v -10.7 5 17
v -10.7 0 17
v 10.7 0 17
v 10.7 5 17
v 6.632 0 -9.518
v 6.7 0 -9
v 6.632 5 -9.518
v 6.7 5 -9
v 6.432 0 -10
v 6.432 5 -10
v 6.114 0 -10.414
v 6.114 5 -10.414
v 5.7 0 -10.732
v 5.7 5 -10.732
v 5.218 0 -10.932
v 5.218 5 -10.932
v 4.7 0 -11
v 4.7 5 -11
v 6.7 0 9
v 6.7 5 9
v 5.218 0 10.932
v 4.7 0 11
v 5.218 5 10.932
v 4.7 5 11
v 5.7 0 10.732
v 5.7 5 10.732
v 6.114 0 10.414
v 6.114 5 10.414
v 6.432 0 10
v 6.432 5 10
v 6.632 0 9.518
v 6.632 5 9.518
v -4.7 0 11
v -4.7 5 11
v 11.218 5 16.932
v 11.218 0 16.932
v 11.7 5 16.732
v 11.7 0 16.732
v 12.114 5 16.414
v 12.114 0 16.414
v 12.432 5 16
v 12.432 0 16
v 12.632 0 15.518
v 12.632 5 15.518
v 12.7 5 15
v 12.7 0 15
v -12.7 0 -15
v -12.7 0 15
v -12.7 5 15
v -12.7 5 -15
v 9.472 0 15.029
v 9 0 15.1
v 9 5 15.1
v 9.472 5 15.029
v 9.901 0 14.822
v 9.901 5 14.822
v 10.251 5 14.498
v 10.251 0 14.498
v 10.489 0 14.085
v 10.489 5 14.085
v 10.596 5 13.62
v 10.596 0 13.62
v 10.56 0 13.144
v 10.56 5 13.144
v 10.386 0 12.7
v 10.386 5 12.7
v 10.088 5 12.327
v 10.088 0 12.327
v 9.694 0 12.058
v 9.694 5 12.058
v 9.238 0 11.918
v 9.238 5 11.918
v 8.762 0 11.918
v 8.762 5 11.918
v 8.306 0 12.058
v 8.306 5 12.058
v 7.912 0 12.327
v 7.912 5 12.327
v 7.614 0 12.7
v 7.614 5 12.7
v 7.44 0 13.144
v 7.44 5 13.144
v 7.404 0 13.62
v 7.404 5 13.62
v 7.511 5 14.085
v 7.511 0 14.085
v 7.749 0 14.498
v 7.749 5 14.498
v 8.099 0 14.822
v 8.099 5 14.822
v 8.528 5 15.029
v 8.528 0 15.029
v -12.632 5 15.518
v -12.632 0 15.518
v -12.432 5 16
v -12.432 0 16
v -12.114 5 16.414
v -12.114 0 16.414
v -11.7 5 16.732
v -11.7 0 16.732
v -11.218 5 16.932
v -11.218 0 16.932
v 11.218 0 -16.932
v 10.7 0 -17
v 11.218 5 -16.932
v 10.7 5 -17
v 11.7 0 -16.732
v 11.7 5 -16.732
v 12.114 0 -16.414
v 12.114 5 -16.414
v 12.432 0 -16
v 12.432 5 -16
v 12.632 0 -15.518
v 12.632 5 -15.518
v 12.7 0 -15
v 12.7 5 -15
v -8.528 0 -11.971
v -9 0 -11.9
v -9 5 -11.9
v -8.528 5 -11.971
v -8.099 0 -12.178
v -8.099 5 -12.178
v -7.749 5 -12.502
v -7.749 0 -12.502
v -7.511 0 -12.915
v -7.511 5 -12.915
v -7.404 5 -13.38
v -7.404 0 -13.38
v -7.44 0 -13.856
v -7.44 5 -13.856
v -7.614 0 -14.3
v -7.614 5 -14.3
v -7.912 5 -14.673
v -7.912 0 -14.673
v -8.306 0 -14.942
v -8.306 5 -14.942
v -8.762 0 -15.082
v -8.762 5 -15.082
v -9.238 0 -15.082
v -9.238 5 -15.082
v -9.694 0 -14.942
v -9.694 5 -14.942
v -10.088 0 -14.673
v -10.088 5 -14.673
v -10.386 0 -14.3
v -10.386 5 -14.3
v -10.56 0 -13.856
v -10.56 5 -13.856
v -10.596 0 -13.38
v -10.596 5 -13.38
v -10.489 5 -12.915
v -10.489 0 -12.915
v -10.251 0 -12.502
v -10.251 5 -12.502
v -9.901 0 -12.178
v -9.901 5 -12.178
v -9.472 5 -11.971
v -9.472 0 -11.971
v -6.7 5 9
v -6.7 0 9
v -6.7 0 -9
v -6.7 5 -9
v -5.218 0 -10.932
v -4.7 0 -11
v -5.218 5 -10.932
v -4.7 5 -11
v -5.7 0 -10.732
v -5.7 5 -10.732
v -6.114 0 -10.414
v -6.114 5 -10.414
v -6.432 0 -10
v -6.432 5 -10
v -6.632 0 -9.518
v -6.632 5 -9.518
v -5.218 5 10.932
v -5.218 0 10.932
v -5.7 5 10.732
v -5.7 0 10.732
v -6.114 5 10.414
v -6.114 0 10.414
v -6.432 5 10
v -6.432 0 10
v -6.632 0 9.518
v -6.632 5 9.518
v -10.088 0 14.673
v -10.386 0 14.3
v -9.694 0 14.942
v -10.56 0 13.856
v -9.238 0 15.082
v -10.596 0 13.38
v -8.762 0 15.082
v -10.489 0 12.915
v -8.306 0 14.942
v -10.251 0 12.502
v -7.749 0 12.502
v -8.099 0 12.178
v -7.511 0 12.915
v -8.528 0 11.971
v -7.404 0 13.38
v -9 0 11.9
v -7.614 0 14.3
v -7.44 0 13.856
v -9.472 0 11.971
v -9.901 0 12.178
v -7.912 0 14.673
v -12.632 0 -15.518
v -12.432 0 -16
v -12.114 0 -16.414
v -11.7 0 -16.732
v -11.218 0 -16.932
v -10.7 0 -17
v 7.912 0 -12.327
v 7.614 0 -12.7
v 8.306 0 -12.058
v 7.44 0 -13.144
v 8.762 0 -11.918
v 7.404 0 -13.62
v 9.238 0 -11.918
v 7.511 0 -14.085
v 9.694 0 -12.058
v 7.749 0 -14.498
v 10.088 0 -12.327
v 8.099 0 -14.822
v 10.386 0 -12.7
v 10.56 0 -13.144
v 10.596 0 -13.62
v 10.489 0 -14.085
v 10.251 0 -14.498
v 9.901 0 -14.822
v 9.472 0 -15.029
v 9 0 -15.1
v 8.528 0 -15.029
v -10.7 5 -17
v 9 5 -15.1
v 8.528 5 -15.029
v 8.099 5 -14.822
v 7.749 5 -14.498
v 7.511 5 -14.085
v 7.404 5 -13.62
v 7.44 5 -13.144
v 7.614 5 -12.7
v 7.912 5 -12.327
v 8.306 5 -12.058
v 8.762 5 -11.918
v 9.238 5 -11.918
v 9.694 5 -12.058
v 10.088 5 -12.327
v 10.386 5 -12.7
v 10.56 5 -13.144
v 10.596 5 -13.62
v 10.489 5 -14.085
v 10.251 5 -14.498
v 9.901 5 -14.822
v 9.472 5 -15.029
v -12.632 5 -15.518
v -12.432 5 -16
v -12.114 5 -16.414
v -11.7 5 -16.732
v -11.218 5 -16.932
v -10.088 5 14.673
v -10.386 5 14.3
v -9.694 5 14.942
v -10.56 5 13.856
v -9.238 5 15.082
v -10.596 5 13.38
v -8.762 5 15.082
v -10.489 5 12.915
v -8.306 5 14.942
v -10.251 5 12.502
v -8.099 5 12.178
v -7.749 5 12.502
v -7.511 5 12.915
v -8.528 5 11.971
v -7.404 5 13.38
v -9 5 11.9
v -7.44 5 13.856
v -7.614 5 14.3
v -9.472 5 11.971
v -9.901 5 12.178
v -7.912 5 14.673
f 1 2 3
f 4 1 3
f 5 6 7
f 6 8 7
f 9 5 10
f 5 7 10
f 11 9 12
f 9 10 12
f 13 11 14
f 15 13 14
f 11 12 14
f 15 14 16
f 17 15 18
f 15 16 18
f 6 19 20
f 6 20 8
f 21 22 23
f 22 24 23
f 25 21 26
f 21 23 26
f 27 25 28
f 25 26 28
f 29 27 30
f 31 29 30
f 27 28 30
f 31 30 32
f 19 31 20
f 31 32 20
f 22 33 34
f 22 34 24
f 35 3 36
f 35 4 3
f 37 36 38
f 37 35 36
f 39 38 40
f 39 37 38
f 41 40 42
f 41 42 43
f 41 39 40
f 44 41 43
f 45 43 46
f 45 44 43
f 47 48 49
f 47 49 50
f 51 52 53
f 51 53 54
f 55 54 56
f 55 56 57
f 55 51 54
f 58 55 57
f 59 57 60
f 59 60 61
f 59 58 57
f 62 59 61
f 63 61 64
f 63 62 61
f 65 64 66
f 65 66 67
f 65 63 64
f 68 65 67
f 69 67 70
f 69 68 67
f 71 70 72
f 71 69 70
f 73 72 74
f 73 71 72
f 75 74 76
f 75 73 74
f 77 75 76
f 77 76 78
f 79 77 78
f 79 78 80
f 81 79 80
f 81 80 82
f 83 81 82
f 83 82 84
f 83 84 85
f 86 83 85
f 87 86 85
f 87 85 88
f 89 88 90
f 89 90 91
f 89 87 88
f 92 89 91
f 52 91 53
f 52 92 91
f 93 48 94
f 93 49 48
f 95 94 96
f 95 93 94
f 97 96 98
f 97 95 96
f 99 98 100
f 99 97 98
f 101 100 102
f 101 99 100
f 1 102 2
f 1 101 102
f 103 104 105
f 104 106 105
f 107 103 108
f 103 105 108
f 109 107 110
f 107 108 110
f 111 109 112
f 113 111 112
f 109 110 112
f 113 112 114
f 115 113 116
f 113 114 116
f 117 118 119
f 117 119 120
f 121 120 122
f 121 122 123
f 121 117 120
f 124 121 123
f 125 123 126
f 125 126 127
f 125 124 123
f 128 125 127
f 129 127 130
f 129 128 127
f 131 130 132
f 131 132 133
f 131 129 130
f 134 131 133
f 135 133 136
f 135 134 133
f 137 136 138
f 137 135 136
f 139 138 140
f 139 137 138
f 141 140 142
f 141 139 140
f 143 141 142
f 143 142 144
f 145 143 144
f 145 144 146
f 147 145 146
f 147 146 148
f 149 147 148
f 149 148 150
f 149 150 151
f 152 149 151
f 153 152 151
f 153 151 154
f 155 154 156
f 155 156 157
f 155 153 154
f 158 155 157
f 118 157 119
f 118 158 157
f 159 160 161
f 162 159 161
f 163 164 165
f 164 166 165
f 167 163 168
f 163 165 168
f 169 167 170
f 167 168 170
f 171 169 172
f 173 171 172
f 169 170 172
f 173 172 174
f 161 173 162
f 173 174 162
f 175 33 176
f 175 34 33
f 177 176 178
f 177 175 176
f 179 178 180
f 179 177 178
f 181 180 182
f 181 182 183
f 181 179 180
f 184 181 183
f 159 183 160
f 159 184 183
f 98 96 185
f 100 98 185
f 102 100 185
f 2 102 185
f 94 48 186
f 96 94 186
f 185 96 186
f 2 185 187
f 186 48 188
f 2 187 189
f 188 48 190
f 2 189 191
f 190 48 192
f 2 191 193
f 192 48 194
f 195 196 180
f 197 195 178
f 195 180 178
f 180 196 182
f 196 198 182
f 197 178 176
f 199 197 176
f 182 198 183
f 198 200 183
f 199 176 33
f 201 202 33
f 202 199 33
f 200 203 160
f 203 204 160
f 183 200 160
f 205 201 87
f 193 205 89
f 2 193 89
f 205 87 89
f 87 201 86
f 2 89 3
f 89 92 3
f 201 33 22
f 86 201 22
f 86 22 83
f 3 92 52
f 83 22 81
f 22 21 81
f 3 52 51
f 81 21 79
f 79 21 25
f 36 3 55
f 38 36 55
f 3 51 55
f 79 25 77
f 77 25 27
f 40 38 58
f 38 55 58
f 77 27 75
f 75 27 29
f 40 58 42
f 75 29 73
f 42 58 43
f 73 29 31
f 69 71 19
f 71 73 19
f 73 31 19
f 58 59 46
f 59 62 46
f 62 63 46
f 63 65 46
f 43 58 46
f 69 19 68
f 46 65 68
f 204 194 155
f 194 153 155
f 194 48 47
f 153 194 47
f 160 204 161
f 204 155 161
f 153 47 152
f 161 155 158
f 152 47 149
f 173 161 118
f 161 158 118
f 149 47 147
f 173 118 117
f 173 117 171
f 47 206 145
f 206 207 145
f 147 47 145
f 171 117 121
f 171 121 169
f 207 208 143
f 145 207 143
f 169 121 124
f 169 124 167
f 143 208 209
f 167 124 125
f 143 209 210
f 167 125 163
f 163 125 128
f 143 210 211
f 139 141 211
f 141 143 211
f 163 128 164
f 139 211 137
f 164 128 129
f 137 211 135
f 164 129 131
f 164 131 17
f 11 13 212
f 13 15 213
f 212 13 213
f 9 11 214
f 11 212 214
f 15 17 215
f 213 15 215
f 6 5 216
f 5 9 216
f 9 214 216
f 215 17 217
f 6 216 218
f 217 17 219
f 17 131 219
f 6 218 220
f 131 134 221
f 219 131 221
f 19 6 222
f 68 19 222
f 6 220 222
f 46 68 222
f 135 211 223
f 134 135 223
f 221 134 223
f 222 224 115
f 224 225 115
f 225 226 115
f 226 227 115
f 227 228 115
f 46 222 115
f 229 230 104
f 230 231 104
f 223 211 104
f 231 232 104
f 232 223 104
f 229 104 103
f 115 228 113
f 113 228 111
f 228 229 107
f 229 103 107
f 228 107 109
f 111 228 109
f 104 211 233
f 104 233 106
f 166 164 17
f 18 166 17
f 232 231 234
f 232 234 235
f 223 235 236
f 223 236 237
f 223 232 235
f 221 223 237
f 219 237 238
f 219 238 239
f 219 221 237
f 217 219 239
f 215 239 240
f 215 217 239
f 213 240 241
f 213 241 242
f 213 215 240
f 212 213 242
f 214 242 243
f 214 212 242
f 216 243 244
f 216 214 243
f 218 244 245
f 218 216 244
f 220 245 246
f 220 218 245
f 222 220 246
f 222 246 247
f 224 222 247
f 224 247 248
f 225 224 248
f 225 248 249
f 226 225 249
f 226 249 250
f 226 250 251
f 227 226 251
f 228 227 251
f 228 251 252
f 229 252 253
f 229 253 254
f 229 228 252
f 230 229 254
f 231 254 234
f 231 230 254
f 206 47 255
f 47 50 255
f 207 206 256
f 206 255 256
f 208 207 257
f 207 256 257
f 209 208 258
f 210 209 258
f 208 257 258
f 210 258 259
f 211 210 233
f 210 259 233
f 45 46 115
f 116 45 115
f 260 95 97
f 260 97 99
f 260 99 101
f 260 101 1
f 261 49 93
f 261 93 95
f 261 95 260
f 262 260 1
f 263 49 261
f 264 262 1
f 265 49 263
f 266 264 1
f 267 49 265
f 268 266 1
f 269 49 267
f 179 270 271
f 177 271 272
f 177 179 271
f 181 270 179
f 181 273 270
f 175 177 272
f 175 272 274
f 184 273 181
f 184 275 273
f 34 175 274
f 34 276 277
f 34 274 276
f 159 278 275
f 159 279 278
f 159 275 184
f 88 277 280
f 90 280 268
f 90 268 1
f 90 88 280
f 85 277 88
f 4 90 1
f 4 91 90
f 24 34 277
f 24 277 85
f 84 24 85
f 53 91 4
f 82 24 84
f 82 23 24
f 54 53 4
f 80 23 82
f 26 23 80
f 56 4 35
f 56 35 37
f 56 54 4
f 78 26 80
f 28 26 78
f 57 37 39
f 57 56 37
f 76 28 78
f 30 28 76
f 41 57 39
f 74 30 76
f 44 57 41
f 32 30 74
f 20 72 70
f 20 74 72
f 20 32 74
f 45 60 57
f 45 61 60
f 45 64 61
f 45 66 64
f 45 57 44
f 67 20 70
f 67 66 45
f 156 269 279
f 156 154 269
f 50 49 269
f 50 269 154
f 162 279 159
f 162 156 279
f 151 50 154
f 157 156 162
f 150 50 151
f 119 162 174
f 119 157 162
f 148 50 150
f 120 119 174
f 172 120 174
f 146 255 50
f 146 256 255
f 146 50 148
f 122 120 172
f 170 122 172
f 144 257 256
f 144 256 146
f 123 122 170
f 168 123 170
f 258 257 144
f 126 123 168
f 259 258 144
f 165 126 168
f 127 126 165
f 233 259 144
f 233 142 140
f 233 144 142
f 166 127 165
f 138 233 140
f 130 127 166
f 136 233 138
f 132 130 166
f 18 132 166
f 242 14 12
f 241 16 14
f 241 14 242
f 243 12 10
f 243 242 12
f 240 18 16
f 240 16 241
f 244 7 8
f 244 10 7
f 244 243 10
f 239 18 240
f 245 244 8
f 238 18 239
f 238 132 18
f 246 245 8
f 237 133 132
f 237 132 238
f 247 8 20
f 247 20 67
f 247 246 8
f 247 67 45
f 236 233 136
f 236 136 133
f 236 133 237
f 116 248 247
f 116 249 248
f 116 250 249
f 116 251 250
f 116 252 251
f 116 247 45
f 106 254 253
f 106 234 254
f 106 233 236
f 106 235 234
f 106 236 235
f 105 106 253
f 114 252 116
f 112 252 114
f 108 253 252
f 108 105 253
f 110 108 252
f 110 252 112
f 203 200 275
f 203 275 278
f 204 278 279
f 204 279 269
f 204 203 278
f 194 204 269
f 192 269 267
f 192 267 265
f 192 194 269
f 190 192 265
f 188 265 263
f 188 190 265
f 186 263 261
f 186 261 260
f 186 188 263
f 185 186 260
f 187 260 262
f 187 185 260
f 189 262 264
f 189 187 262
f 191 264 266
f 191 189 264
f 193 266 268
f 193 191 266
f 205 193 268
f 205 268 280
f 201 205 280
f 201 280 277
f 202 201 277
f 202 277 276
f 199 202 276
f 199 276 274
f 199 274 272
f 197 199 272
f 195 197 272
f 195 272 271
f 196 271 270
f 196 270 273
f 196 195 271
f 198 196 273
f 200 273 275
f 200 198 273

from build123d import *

# Parameters (mm, degrees)
SKETCH_1_W      = 25.4
SKETCH_1_H      = 34
SKETCH_1_R      = 1.6
SKETCH_1_W_2    = 13.4
SKETCH_1_H_2    = 22
EXTRUDE_1_DEPTH = 5
FILLET_1_R      = 2


with BuildPart() as part:
    # 草图1 → 凸台-拉伸1 (new body)
    with BuildSketch(Plane(origin=(0, 0, 0), x_dir=(1, 0, 0), z_dir=(0, 1, 0))):
        Rectangle(SKETCH_1_W, SKETCH_1_H)
        with Locations(Location((-9, 13.5, 0), (0, 0, 270))):
            Circle(SKETCH_1_R, mode=Mode.SUBTRACT)
        with Locations(Location((9, 13.5, 0), (0, 0, 90))):
            Circle(SKETCH_1_R, mode=Mode.SUBTRACT)
        with Locations(Location((9, -13.5, 0), (0, 0, 270))):
            Circle(SKETCH_1_R, mode=Mode.SUBTRACT)
        with Locations(Location((-9, -13.5, 0), (0, 0, 90))):
            Circle(SKETCH_1_R, mode=Mode.SUBTRACT)
        Rectangle(SKETCH_1_W_2, SKETCH_1_H_2, mode=Mode.SUBTRACT)
    extrude(amount=EXTRUDE_1_DEPTH)

    # 圆角1
    fillet_1_edges = [part.edges().sort_by_distance(p)[0] for p in [
        (6.7, 2.5, -11),
        (-6.7, 2.5, -11),
        (-6.7, 2.5, 11),
        (6.7, 2.5, 11),
        (12.7, 2.5, 17),
        (-12.7, 2.5, 17),
        (-12.7, 2.5, -17),
        (12.7, 2.5, -17),
    ]]
    fillet(fillet_1_edges, radius=FILLET_1_R)


solid = part.part
